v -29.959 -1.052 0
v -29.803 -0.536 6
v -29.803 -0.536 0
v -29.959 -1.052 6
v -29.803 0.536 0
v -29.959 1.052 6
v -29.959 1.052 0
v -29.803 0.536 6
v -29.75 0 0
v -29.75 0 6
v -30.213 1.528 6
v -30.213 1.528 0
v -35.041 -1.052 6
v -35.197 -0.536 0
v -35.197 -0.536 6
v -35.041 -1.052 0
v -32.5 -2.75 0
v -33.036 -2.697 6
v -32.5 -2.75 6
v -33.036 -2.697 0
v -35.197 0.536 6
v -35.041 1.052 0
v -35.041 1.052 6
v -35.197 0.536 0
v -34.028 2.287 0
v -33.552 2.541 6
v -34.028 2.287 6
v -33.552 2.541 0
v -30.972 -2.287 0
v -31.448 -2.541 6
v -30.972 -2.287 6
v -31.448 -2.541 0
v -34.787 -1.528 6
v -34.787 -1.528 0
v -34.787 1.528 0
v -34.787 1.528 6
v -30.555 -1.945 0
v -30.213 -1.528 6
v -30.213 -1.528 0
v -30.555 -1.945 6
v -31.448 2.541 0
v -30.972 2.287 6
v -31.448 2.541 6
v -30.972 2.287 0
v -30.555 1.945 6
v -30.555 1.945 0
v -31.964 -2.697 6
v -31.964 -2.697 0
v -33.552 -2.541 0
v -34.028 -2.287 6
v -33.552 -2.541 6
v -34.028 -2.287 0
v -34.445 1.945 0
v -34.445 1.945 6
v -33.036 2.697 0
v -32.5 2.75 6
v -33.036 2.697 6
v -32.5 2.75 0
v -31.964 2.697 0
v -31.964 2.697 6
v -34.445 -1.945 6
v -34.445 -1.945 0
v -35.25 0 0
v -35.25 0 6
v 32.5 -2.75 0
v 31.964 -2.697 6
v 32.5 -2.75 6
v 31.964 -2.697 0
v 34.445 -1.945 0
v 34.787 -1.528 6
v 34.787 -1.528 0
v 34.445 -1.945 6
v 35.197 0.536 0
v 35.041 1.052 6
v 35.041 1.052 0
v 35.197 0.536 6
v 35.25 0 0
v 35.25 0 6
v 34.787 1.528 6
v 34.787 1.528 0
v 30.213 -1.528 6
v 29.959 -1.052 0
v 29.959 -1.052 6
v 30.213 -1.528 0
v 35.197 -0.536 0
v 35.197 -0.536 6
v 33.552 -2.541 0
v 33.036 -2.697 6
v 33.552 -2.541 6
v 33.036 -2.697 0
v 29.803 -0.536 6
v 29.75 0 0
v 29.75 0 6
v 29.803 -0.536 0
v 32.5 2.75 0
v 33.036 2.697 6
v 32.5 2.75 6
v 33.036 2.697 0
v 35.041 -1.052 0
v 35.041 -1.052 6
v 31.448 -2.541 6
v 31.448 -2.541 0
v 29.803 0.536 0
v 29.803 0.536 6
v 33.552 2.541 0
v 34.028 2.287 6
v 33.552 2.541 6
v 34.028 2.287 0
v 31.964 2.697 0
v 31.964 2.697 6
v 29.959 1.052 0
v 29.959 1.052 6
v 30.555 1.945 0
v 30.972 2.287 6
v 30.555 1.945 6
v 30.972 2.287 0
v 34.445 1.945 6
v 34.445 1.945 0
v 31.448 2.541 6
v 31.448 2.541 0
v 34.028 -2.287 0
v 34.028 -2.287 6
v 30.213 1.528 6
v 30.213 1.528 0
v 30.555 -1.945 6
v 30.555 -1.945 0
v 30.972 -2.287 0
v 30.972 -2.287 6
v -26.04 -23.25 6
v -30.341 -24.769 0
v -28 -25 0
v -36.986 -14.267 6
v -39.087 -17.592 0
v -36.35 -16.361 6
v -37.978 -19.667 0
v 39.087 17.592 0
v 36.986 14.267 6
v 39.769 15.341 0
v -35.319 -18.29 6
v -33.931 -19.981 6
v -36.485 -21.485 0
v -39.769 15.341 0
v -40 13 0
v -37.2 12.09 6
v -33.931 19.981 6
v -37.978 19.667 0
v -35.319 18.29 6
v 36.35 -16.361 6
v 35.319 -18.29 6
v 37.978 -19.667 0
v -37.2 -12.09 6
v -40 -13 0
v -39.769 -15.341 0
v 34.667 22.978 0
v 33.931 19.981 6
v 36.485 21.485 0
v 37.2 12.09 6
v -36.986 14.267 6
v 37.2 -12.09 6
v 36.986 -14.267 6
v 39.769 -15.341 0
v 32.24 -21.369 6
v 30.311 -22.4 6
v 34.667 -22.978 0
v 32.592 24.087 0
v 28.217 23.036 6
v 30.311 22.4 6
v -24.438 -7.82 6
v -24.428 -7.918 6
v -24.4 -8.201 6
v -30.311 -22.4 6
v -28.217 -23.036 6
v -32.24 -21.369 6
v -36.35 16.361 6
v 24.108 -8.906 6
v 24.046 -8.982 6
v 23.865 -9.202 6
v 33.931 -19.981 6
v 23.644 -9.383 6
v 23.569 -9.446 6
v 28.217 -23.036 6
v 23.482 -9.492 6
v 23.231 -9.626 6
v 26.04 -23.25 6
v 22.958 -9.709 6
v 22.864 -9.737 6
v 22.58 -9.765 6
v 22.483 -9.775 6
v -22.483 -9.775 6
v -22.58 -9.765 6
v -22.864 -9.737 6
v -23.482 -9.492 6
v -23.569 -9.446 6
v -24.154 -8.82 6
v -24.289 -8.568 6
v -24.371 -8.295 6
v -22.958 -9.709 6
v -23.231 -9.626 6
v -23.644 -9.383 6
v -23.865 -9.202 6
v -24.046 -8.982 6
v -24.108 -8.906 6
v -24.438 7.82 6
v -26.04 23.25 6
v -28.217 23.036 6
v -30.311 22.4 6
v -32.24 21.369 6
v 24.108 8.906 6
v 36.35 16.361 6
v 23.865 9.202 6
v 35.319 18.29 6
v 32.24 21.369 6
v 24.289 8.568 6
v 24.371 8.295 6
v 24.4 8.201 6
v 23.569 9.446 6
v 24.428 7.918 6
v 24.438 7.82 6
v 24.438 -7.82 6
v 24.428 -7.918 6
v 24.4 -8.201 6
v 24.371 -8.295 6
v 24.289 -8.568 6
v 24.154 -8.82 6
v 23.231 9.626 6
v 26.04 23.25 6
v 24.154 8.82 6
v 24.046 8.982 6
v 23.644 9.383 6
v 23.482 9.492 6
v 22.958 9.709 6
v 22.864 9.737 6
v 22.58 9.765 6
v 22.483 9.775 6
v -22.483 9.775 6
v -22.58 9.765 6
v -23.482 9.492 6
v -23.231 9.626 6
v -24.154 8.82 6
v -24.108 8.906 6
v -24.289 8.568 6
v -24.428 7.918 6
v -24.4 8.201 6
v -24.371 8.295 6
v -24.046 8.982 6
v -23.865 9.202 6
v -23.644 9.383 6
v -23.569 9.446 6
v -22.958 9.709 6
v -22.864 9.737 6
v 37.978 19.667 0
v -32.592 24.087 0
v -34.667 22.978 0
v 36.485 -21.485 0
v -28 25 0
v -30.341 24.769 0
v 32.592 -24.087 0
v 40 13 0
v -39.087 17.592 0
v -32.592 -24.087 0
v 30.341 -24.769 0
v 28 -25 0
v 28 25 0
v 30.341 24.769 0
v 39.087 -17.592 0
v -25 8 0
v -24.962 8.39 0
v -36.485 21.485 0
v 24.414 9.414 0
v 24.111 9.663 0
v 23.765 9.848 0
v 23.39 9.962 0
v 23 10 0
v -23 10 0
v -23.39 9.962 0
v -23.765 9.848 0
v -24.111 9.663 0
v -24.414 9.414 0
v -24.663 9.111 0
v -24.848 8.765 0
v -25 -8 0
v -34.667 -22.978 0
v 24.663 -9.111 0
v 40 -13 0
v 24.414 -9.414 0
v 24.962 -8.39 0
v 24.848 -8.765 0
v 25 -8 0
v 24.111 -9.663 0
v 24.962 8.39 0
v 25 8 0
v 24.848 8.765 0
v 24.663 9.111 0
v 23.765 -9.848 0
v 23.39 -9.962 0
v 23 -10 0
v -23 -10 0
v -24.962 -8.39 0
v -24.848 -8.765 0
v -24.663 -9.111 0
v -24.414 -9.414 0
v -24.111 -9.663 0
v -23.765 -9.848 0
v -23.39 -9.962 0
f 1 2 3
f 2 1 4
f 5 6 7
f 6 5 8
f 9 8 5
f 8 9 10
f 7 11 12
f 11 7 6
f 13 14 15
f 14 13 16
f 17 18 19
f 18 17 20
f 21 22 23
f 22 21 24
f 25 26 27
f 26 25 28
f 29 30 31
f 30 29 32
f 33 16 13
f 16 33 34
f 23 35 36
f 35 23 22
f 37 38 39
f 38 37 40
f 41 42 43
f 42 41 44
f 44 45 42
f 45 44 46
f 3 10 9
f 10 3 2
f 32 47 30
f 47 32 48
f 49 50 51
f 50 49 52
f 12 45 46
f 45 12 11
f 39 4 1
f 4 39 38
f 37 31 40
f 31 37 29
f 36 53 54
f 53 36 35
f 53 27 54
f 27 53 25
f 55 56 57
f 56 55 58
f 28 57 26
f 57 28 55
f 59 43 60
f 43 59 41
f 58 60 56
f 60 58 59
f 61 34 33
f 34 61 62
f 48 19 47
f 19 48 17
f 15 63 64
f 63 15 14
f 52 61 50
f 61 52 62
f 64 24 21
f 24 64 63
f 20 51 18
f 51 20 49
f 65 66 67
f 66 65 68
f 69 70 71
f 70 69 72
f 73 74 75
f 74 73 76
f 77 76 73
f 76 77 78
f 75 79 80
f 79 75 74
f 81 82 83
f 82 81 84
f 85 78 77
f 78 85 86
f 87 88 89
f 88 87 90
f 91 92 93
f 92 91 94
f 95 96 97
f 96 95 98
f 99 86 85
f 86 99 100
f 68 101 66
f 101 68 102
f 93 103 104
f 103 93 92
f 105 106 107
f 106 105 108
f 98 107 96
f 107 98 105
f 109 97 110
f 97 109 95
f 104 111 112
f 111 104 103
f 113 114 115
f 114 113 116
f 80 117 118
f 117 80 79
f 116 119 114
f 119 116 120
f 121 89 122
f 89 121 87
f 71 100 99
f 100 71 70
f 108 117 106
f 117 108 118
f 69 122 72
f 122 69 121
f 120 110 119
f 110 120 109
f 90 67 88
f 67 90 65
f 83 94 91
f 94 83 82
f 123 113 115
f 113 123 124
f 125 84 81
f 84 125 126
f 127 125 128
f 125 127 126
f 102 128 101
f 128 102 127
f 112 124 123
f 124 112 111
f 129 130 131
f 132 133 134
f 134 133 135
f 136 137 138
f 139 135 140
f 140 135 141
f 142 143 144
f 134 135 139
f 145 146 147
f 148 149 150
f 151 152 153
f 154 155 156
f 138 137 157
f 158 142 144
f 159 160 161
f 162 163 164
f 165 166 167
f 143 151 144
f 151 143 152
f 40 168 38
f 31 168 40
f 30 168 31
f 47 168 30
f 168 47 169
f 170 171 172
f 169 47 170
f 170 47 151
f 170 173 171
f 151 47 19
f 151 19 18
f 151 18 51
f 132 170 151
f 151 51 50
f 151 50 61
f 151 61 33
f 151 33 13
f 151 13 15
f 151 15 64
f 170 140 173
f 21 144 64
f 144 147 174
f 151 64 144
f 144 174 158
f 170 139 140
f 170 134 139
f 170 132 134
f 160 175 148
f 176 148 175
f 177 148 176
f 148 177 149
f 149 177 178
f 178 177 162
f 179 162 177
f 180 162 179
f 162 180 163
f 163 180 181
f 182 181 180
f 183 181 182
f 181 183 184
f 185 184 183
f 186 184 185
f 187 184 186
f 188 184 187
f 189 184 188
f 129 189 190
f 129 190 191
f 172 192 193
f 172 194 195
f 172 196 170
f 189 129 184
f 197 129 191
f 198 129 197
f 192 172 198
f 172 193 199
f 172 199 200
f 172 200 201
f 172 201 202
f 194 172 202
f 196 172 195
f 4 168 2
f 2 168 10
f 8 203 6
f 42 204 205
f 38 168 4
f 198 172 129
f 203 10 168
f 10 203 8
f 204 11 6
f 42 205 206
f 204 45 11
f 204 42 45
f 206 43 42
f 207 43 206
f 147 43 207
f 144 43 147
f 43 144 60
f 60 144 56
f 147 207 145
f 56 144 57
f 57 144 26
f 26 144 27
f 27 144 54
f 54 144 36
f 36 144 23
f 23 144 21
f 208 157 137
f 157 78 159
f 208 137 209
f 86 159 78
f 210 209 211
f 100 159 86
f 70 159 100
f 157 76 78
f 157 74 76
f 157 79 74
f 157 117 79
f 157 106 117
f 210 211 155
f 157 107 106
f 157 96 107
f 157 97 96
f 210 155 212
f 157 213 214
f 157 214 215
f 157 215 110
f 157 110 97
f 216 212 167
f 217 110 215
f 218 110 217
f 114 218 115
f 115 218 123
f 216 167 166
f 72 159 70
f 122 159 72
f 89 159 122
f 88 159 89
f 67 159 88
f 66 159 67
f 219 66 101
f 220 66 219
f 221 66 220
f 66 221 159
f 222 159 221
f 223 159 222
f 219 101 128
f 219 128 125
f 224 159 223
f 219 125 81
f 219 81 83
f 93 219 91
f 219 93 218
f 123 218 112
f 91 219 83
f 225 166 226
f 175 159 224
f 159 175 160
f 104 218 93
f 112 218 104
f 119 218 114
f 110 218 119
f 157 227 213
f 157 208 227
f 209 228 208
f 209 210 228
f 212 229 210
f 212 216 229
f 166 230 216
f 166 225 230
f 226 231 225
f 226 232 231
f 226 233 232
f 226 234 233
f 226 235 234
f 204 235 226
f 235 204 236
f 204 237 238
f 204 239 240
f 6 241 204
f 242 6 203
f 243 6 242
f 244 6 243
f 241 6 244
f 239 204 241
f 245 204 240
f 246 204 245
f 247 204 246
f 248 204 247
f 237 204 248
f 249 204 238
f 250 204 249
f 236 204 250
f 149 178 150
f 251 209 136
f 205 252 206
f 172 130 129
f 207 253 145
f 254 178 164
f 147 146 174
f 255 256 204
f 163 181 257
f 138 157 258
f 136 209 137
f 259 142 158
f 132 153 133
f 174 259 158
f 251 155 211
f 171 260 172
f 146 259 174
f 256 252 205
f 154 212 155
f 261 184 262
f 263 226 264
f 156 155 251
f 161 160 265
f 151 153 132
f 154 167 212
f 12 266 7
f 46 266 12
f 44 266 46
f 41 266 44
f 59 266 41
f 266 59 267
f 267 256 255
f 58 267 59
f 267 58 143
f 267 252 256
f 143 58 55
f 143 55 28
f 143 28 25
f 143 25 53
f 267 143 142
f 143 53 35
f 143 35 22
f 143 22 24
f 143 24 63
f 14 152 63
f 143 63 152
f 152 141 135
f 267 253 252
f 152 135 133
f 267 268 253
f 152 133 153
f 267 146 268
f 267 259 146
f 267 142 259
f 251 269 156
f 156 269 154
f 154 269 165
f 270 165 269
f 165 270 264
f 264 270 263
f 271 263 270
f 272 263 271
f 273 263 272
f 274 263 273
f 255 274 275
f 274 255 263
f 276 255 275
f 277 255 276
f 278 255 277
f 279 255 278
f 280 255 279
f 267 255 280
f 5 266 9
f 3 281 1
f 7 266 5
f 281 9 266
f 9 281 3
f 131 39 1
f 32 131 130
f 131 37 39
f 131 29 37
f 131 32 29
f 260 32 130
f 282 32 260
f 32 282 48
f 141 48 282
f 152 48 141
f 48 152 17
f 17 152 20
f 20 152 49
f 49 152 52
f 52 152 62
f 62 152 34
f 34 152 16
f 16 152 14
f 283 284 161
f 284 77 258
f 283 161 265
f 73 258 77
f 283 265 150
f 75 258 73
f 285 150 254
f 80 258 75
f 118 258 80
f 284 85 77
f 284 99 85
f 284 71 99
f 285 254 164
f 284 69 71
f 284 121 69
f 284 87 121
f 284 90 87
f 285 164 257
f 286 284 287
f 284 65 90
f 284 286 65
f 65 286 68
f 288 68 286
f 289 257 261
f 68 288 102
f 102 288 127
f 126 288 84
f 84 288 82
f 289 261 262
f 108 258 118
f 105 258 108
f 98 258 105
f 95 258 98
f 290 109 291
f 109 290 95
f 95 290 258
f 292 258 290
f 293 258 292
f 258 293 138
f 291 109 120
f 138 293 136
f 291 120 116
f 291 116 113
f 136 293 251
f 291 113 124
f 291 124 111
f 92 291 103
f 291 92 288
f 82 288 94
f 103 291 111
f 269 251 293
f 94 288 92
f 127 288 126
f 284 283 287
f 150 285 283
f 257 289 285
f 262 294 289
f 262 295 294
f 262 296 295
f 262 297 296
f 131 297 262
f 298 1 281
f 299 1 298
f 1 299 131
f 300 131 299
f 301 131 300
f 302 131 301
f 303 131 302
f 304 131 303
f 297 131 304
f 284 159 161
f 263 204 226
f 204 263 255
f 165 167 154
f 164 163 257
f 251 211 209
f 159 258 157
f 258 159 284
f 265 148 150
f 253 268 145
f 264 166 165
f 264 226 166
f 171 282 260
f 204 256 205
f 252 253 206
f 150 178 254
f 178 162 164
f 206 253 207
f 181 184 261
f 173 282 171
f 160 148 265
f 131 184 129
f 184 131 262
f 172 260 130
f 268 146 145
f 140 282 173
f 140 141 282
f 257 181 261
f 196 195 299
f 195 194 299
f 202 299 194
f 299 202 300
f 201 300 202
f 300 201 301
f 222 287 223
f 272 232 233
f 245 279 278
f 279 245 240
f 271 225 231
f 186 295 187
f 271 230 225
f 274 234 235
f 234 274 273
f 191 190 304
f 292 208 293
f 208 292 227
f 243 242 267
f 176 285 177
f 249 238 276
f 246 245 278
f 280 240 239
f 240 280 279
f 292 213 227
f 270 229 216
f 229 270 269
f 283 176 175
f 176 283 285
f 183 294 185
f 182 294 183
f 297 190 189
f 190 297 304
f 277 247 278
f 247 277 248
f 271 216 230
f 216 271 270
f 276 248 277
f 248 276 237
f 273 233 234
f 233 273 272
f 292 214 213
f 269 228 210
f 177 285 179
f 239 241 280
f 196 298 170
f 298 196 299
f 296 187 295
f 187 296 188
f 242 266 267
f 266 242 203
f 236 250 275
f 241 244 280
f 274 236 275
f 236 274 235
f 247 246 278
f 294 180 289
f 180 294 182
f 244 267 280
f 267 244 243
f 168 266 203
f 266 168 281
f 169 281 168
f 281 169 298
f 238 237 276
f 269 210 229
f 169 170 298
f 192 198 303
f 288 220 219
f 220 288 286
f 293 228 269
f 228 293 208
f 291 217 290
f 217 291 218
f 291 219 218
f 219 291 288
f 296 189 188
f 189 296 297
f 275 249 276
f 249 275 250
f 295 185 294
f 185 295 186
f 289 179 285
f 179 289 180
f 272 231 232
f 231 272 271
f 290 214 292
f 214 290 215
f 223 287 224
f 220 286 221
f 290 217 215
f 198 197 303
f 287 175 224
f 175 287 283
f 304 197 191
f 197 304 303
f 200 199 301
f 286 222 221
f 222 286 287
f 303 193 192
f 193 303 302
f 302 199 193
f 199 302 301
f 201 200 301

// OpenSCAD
$fn = 32;

// ----------------------------------------------------------------------
// Display bezel: 80 x 50 mm frame, opening 50x20 mm
// ----------------------------------------------------------------------

// --- parameters (mm) ---
length = 80;              // frame outside length, X
width = 50;               // frame outside width, Y
frame_w = 15;             // frame width
thickness = 6;            // frame thickness
corner_r = 12;            // outside corner radius
chamfer = 0.93;           // outer wall taper
funnel = 0.97;            // inner opening taper
opening_l = 50;           // opening length
opening_w = 20;           // opening width
inner_r = 2;              // opening corner radius
hole_d = 5.5;             // mounting screw clearance
holes_per_side = 1;       // holes per short side
hole_inset = 7.5;         // hole centre inset from the outside edge

/* rounded-rectangle outlines, generated with loops */
module rounded_ring(l_nom, w_nom, r) {
  hull() {
    for (sx = [-1, 1]) for (sy = [-1, 1])
      translate([sx * (l_nom / 2 - r), sy * (w_nom / 2 - r)]) circle(r = r);
  }
}

difference() {
  /* frame body, drafted so the outer edge is a variable-depth chamfer */
  linear_extrude(height = thickness, scale = chamfer)
    rounded_ring(length, width, corner_r);
  /* viewing opening, drafted the other way for a funnel edge */
  linear_extrude(height = thickness + 2, scale = funnel)
    translate([0, 0, -1]) rounded_ring(opening_l, opening_w, inner_r);
  /* mounting screws through the frame lands */
  for (sx = [-1, 1]) for (i = [1 : holes_per_side])
    translate([sx * (length / 2 - hole_inset),
               (i - (holes_per_side + 1) / 2) * width * 0.5, -1])
      cylinder(h = thickness + 2, d = hole_d);
}
